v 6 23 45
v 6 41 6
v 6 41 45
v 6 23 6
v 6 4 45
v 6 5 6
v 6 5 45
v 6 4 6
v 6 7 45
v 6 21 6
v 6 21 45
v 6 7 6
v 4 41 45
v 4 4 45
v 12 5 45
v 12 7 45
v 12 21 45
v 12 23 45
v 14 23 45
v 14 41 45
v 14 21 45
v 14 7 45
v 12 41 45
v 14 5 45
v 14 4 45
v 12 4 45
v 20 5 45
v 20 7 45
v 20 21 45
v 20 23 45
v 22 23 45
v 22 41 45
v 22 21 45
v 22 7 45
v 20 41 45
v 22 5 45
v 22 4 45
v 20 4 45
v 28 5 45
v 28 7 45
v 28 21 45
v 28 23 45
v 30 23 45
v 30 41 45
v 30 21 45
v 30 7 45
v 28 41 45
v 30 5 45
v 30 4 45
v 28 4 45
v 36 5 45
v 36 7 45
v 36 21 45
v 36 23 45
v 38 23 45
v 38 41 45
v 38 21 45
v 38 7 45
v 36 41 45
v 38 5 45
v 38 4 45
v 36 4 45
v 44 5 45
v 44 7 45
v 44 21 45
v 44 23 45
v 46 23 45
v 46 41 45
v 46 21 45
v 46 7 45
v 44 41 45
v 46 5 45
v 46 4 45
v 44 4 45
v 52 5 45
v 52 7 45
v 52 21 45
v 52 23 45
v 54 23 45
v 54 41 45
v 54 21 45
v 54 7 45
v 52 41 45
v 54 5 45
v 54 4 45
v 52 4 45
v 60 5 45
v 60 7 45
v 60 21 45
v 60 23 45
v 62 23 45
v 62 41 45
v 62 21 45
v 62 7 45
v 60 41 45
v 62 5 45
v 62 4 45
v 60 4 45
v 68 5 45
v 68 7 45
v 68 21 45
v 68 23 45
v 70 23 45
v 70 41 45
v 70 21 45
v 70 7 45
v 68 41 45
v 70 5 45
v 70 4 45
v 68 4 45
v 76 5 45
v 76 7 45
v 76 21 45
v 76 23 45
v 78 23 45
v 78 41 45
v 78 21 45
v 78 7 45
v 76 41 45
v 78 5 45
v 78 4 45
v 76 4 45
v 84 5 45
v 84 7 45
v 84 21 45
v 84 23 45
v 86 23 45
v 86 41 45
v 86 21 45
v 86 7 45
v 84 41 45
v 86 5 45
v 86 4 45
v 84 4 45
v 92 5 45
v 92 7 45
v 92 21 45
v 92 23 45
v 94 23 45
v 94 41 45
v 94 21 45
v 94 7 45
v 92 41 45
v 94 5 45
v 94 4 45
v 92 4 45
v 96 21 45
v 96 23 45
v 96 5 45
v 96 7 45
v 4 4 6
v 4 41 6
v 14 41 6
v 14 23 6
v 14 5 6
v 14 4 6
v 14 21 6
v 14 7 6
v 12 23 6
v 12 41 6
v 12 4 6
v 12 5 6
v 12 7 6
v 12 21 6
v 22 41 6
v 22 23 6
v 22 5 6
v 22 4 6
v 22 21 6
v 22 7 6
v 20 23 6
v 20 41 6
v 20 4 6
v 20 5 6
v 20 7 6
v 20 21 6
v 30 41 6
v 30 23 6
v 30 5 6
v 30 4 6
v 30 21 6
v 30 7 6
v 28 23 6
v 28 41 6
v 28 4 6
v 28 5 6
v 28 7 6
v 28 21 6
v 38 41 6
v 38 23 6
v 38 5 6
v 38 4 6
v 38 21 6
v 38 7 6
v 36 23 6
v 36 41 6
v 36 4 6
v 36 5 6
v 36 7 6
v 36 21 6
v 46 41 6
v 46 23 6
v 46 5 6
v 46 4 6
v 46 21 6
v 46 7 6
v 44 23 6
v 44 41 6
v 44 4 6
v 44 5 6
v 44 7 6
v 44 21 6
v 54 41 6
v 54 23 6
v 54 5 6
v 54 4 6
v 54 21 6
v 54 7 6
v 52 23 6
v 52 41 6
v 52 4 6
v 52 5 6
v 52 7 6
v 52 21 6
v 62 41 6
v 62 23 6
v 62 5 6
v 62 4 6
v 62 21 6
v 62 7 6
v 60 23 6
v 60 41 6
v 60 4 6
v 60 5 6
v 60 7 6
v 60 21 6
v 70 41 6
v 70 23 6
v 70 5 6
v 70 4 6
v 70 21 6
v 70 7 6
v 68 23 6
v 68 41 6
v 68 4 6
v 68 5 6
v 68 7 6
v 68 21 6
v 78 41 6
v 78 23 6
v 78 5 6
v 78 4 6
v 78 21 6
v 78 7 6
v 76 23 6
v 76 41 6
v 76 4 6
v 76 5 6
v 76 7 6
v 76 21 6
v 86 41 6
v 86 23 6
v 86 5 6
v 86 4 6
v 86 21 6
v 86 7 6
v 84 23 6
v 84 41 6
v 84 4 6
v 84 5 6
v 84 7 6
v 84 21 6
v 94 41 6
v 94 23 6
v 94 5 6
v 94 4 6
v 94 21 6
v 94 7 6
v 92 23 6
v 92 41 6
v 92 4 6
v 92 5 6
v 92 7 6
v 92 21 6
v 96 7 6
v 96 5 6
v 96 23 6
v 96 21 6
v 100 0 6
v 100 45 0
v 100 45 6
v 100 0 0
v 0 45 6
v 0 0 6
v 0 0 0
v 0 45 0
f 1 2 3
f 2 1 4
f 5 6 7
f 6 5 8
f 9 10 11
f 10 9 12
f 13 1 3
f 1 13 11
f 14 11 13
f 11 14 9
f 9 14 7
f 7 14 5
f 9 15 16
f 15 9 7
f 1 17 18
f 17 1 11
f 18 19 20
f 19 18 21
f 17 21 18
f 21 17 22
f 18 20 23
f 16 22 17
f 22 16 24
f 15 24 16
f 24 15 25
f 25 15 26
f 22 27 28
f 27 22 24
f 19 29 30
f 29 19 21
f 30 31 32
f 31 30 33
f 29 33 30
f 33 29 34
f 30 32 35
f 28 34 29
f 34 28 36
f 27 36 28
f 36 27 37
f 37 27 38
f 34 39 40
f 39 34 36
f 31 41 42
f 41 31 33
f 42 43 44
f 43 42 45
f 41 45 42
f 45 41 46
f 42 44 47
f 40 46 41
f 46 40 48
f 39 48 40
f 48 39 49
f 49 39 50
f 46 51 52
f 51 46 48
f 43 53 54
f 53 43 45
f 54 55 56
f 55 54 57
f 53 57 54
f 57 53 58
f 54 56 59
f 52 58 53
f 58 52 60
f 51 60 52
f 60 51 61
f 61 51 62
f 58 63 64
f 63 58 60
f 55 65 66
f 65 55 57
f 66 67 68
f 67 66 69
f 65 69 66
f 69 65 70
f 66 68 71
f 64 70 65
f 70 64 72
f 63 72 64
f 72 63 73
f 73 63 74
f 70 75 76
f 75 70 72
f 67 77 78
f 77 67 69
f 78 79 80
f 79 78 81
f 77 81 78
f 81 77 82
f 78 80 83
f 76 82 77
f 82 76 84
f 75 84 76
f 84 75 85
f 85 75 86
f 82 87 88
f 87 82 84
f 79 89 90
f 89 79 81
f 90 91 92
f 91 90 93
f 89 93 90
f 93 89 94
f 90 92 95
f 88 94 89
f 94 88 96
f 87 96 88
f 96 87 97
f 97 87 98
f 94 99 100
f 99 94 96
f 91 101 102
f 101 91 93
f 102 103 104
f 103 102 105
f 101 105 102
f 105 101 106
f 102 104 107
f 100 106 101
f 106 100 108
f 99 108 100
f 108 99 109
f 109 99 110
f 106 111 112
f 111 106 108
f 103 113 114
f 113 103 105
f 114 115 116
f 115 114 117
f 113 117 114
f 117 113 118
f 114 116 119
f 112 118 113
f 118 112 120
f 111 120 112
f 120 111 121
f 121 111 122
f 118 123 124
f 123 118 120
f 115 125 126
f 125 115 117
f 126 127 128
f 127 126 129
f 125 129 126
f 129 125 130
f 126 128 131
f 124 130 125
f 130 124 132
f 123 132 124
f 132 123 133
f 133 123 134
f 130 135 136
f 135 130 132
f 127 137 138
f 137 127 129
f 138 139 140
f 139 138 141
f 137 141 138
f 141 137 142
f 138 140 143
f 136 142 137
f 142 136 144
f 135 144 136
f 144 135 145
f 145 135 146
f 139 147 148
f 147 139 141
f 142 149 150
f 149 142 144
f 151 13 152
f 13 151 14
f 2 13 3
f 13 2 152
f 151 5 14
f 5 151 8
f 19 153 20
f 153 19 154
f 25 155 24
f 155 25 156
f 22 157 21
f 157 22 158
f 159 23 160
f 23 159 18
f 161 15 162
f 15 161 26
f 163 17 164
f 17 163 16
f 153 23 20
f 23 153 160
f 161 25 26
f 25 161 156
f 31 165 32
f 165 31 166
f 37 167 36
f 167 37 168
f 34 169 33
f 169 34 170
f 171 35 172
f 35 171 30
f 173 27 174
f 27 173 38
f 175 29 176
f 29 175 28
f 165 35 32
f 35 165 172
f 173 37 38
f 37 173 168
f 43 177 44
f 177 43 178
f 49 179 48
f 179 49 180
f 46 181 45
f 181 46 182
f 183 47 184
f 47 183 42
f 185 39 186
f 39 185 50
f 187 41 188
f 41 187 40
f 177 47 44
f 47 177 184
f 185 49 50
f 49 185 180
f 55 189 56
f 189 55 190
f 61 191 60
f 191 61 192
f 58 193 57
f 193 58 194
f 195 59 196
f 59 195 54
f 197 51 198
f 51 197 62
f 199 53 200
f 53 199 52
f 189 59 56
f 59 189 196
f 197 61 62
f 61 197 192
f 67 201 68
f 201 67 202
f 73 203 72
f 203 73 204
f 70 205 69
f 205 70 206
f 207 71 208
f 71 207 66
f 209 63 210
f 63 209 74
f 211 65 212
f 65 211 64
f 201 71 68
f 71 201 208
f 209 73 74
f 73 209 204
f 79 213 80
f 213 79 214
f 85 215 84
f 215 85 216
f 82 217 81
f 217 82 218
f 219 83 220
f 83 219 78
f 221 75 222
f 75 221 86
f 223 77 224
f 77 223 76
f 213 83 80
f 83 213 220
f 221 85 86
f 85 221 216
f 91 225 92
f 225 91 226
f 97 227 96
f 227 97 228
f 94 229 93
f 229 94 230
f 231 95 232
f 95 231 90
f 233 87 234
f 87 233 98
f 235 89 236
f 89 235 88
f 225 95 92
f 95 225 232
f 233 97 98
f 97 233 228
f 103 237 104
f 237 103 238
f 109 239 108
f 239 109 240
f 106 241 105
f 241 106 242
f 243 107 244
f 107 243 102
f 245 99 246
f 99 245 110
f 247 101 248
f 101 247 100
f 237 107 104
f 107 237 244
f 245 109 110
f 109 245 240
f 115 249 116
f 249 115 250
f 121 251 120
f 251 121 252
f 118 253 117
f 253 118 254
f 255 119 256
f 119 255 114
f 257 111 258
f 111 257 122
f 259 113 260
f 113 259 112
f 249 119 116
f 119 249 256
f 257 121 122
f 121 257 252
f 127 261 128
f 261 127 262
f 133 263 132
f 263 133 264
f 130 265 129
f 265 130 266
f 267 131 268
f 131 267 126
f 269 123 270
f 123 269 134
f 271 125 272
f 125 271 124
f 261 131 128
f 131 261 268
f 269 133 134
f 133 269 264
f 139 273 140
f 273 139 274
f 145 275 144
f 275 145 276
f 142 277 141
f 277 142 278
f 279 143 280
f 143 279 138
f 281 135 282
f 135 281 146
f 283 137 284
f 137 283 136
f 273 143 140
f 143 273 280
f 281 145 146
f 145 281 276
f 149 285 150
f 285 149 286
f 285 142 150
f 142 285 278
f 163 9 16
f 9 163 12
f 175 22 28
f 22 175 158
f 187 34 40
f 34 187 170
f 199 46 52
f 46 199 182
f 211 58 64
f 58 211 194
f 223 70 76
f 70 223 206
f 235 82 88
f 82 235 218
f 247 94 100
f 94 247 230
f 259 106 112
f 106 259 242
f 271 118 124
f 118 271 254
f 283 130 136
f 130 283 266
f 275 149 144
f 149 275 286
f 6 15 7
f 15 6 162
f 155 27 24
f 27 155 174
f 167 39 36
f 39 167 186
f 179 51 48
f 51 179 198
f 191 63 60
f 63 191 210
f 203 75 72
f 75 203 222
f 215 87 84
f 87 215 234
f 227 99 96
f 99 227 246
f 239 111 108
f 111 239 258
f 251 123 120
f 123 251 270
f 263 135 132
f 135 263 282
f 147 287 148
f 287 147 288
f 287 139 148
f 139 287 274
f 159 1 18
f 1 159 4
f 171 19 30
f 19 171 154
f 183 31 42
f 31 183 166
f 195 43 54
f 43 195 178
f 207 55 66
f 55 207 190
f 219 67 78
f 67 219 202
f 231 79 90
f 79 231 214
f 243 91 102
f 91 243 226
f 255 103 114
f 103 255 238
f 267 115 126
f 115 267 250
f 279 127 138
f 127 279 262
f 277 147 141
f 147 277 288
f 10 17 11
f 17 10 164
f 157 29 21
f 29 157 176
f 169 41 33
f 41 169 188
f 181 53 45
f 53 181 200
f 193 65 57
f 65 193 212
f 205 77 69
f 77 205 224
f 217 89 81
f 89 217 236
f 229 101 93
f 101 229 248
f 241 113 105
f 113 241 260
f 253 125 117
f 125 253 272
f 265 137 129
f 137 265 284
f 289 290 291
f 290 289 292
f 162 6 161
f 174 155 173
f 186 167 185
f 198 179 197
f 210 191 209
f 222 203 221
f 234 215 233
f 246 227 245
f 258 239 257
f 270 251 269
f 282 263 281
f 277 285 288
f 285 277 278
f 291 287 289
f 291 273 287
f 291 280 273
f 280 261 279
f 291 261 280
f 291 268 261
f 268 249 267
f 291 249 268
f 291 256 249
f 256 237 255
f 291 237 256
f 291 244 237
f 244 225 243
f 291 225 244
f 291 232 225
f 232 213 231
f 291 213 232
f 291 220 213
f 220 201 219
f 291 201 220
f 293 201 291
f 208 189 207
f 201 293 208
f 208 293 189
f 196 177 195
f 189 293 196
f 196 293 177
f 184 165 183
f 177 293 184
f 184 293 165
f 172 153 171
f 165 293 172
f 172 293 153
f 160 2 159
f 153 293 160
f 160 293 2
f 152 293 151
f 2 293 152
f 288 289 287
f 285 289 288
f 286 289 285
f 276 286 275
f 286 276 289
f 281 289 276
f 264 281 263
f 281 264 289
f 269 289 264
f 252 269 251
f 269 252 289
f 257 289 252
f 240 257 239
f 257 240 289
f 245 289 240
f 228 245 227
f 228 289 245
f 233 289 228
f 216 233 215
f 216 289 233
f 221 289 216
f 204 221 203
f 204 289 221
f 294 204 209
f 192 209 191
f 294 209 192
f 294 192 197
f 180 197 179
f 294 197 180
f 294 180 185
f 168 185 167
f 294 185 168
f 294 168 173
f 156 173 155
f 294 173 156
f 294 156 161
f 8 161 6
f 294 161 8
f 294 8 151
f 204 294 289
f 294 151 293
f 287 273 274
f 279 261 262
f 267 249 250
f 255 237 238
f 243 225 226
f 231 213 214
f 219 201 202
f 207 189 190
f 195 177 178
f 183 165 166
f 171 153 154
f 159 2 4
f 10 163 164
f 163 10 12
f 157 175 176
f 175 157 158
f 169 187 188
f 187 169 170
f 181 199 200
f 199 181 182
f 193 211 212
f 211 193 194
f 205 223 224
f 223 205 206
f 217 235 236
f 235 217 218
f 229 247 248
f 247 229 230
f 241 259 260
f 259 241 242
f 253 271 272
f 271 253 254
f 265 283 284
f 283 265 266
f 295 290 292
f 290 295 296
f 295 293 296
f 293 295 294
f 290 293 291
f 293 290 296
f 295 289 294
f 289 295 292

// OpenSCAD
$fn = 32;

// ----------------------------------------------------------------------
// Heatsink: cross fin block
// ----------------------------------------------------------------------

// --- parameters (mm) ---
base_l = 100;             // base length, X
base_w = 45;              // base width, Y
base_t = 6;               // base plate thickness
fin_h = 40;               // fin height above the base
fin_t = 2;                // fin thickness
edge = 4;                 // margin from the base ends
pitch = 8;                // fin pitch
rib_pitch = 16;           // cross rib pitch

n_fins = floor((base_l - 2 * edge - fin_t) / pitch) + 1;  // fin count
total_h = base_t + fin_h - 1;  // overall height
n_ribs = floor((base_w - 2 * edge) / rib_pitch);  // rib count

union() {
  cube([base_l, base_w, base_t]);
  for (i = [0 : n_fins - 1])
    translate([edge + i * pitch, edge, base_t - 1])
      cube([fin_t, base_w - 2 * edge, fin_h]);
  for (i = [0 : n_ribs - 1])
    translate([edge, edge + 1 + i * rib_pitch, base_t - 1])
      cube([base_l - 2 * edge, fin_t, fin_h]);
}
